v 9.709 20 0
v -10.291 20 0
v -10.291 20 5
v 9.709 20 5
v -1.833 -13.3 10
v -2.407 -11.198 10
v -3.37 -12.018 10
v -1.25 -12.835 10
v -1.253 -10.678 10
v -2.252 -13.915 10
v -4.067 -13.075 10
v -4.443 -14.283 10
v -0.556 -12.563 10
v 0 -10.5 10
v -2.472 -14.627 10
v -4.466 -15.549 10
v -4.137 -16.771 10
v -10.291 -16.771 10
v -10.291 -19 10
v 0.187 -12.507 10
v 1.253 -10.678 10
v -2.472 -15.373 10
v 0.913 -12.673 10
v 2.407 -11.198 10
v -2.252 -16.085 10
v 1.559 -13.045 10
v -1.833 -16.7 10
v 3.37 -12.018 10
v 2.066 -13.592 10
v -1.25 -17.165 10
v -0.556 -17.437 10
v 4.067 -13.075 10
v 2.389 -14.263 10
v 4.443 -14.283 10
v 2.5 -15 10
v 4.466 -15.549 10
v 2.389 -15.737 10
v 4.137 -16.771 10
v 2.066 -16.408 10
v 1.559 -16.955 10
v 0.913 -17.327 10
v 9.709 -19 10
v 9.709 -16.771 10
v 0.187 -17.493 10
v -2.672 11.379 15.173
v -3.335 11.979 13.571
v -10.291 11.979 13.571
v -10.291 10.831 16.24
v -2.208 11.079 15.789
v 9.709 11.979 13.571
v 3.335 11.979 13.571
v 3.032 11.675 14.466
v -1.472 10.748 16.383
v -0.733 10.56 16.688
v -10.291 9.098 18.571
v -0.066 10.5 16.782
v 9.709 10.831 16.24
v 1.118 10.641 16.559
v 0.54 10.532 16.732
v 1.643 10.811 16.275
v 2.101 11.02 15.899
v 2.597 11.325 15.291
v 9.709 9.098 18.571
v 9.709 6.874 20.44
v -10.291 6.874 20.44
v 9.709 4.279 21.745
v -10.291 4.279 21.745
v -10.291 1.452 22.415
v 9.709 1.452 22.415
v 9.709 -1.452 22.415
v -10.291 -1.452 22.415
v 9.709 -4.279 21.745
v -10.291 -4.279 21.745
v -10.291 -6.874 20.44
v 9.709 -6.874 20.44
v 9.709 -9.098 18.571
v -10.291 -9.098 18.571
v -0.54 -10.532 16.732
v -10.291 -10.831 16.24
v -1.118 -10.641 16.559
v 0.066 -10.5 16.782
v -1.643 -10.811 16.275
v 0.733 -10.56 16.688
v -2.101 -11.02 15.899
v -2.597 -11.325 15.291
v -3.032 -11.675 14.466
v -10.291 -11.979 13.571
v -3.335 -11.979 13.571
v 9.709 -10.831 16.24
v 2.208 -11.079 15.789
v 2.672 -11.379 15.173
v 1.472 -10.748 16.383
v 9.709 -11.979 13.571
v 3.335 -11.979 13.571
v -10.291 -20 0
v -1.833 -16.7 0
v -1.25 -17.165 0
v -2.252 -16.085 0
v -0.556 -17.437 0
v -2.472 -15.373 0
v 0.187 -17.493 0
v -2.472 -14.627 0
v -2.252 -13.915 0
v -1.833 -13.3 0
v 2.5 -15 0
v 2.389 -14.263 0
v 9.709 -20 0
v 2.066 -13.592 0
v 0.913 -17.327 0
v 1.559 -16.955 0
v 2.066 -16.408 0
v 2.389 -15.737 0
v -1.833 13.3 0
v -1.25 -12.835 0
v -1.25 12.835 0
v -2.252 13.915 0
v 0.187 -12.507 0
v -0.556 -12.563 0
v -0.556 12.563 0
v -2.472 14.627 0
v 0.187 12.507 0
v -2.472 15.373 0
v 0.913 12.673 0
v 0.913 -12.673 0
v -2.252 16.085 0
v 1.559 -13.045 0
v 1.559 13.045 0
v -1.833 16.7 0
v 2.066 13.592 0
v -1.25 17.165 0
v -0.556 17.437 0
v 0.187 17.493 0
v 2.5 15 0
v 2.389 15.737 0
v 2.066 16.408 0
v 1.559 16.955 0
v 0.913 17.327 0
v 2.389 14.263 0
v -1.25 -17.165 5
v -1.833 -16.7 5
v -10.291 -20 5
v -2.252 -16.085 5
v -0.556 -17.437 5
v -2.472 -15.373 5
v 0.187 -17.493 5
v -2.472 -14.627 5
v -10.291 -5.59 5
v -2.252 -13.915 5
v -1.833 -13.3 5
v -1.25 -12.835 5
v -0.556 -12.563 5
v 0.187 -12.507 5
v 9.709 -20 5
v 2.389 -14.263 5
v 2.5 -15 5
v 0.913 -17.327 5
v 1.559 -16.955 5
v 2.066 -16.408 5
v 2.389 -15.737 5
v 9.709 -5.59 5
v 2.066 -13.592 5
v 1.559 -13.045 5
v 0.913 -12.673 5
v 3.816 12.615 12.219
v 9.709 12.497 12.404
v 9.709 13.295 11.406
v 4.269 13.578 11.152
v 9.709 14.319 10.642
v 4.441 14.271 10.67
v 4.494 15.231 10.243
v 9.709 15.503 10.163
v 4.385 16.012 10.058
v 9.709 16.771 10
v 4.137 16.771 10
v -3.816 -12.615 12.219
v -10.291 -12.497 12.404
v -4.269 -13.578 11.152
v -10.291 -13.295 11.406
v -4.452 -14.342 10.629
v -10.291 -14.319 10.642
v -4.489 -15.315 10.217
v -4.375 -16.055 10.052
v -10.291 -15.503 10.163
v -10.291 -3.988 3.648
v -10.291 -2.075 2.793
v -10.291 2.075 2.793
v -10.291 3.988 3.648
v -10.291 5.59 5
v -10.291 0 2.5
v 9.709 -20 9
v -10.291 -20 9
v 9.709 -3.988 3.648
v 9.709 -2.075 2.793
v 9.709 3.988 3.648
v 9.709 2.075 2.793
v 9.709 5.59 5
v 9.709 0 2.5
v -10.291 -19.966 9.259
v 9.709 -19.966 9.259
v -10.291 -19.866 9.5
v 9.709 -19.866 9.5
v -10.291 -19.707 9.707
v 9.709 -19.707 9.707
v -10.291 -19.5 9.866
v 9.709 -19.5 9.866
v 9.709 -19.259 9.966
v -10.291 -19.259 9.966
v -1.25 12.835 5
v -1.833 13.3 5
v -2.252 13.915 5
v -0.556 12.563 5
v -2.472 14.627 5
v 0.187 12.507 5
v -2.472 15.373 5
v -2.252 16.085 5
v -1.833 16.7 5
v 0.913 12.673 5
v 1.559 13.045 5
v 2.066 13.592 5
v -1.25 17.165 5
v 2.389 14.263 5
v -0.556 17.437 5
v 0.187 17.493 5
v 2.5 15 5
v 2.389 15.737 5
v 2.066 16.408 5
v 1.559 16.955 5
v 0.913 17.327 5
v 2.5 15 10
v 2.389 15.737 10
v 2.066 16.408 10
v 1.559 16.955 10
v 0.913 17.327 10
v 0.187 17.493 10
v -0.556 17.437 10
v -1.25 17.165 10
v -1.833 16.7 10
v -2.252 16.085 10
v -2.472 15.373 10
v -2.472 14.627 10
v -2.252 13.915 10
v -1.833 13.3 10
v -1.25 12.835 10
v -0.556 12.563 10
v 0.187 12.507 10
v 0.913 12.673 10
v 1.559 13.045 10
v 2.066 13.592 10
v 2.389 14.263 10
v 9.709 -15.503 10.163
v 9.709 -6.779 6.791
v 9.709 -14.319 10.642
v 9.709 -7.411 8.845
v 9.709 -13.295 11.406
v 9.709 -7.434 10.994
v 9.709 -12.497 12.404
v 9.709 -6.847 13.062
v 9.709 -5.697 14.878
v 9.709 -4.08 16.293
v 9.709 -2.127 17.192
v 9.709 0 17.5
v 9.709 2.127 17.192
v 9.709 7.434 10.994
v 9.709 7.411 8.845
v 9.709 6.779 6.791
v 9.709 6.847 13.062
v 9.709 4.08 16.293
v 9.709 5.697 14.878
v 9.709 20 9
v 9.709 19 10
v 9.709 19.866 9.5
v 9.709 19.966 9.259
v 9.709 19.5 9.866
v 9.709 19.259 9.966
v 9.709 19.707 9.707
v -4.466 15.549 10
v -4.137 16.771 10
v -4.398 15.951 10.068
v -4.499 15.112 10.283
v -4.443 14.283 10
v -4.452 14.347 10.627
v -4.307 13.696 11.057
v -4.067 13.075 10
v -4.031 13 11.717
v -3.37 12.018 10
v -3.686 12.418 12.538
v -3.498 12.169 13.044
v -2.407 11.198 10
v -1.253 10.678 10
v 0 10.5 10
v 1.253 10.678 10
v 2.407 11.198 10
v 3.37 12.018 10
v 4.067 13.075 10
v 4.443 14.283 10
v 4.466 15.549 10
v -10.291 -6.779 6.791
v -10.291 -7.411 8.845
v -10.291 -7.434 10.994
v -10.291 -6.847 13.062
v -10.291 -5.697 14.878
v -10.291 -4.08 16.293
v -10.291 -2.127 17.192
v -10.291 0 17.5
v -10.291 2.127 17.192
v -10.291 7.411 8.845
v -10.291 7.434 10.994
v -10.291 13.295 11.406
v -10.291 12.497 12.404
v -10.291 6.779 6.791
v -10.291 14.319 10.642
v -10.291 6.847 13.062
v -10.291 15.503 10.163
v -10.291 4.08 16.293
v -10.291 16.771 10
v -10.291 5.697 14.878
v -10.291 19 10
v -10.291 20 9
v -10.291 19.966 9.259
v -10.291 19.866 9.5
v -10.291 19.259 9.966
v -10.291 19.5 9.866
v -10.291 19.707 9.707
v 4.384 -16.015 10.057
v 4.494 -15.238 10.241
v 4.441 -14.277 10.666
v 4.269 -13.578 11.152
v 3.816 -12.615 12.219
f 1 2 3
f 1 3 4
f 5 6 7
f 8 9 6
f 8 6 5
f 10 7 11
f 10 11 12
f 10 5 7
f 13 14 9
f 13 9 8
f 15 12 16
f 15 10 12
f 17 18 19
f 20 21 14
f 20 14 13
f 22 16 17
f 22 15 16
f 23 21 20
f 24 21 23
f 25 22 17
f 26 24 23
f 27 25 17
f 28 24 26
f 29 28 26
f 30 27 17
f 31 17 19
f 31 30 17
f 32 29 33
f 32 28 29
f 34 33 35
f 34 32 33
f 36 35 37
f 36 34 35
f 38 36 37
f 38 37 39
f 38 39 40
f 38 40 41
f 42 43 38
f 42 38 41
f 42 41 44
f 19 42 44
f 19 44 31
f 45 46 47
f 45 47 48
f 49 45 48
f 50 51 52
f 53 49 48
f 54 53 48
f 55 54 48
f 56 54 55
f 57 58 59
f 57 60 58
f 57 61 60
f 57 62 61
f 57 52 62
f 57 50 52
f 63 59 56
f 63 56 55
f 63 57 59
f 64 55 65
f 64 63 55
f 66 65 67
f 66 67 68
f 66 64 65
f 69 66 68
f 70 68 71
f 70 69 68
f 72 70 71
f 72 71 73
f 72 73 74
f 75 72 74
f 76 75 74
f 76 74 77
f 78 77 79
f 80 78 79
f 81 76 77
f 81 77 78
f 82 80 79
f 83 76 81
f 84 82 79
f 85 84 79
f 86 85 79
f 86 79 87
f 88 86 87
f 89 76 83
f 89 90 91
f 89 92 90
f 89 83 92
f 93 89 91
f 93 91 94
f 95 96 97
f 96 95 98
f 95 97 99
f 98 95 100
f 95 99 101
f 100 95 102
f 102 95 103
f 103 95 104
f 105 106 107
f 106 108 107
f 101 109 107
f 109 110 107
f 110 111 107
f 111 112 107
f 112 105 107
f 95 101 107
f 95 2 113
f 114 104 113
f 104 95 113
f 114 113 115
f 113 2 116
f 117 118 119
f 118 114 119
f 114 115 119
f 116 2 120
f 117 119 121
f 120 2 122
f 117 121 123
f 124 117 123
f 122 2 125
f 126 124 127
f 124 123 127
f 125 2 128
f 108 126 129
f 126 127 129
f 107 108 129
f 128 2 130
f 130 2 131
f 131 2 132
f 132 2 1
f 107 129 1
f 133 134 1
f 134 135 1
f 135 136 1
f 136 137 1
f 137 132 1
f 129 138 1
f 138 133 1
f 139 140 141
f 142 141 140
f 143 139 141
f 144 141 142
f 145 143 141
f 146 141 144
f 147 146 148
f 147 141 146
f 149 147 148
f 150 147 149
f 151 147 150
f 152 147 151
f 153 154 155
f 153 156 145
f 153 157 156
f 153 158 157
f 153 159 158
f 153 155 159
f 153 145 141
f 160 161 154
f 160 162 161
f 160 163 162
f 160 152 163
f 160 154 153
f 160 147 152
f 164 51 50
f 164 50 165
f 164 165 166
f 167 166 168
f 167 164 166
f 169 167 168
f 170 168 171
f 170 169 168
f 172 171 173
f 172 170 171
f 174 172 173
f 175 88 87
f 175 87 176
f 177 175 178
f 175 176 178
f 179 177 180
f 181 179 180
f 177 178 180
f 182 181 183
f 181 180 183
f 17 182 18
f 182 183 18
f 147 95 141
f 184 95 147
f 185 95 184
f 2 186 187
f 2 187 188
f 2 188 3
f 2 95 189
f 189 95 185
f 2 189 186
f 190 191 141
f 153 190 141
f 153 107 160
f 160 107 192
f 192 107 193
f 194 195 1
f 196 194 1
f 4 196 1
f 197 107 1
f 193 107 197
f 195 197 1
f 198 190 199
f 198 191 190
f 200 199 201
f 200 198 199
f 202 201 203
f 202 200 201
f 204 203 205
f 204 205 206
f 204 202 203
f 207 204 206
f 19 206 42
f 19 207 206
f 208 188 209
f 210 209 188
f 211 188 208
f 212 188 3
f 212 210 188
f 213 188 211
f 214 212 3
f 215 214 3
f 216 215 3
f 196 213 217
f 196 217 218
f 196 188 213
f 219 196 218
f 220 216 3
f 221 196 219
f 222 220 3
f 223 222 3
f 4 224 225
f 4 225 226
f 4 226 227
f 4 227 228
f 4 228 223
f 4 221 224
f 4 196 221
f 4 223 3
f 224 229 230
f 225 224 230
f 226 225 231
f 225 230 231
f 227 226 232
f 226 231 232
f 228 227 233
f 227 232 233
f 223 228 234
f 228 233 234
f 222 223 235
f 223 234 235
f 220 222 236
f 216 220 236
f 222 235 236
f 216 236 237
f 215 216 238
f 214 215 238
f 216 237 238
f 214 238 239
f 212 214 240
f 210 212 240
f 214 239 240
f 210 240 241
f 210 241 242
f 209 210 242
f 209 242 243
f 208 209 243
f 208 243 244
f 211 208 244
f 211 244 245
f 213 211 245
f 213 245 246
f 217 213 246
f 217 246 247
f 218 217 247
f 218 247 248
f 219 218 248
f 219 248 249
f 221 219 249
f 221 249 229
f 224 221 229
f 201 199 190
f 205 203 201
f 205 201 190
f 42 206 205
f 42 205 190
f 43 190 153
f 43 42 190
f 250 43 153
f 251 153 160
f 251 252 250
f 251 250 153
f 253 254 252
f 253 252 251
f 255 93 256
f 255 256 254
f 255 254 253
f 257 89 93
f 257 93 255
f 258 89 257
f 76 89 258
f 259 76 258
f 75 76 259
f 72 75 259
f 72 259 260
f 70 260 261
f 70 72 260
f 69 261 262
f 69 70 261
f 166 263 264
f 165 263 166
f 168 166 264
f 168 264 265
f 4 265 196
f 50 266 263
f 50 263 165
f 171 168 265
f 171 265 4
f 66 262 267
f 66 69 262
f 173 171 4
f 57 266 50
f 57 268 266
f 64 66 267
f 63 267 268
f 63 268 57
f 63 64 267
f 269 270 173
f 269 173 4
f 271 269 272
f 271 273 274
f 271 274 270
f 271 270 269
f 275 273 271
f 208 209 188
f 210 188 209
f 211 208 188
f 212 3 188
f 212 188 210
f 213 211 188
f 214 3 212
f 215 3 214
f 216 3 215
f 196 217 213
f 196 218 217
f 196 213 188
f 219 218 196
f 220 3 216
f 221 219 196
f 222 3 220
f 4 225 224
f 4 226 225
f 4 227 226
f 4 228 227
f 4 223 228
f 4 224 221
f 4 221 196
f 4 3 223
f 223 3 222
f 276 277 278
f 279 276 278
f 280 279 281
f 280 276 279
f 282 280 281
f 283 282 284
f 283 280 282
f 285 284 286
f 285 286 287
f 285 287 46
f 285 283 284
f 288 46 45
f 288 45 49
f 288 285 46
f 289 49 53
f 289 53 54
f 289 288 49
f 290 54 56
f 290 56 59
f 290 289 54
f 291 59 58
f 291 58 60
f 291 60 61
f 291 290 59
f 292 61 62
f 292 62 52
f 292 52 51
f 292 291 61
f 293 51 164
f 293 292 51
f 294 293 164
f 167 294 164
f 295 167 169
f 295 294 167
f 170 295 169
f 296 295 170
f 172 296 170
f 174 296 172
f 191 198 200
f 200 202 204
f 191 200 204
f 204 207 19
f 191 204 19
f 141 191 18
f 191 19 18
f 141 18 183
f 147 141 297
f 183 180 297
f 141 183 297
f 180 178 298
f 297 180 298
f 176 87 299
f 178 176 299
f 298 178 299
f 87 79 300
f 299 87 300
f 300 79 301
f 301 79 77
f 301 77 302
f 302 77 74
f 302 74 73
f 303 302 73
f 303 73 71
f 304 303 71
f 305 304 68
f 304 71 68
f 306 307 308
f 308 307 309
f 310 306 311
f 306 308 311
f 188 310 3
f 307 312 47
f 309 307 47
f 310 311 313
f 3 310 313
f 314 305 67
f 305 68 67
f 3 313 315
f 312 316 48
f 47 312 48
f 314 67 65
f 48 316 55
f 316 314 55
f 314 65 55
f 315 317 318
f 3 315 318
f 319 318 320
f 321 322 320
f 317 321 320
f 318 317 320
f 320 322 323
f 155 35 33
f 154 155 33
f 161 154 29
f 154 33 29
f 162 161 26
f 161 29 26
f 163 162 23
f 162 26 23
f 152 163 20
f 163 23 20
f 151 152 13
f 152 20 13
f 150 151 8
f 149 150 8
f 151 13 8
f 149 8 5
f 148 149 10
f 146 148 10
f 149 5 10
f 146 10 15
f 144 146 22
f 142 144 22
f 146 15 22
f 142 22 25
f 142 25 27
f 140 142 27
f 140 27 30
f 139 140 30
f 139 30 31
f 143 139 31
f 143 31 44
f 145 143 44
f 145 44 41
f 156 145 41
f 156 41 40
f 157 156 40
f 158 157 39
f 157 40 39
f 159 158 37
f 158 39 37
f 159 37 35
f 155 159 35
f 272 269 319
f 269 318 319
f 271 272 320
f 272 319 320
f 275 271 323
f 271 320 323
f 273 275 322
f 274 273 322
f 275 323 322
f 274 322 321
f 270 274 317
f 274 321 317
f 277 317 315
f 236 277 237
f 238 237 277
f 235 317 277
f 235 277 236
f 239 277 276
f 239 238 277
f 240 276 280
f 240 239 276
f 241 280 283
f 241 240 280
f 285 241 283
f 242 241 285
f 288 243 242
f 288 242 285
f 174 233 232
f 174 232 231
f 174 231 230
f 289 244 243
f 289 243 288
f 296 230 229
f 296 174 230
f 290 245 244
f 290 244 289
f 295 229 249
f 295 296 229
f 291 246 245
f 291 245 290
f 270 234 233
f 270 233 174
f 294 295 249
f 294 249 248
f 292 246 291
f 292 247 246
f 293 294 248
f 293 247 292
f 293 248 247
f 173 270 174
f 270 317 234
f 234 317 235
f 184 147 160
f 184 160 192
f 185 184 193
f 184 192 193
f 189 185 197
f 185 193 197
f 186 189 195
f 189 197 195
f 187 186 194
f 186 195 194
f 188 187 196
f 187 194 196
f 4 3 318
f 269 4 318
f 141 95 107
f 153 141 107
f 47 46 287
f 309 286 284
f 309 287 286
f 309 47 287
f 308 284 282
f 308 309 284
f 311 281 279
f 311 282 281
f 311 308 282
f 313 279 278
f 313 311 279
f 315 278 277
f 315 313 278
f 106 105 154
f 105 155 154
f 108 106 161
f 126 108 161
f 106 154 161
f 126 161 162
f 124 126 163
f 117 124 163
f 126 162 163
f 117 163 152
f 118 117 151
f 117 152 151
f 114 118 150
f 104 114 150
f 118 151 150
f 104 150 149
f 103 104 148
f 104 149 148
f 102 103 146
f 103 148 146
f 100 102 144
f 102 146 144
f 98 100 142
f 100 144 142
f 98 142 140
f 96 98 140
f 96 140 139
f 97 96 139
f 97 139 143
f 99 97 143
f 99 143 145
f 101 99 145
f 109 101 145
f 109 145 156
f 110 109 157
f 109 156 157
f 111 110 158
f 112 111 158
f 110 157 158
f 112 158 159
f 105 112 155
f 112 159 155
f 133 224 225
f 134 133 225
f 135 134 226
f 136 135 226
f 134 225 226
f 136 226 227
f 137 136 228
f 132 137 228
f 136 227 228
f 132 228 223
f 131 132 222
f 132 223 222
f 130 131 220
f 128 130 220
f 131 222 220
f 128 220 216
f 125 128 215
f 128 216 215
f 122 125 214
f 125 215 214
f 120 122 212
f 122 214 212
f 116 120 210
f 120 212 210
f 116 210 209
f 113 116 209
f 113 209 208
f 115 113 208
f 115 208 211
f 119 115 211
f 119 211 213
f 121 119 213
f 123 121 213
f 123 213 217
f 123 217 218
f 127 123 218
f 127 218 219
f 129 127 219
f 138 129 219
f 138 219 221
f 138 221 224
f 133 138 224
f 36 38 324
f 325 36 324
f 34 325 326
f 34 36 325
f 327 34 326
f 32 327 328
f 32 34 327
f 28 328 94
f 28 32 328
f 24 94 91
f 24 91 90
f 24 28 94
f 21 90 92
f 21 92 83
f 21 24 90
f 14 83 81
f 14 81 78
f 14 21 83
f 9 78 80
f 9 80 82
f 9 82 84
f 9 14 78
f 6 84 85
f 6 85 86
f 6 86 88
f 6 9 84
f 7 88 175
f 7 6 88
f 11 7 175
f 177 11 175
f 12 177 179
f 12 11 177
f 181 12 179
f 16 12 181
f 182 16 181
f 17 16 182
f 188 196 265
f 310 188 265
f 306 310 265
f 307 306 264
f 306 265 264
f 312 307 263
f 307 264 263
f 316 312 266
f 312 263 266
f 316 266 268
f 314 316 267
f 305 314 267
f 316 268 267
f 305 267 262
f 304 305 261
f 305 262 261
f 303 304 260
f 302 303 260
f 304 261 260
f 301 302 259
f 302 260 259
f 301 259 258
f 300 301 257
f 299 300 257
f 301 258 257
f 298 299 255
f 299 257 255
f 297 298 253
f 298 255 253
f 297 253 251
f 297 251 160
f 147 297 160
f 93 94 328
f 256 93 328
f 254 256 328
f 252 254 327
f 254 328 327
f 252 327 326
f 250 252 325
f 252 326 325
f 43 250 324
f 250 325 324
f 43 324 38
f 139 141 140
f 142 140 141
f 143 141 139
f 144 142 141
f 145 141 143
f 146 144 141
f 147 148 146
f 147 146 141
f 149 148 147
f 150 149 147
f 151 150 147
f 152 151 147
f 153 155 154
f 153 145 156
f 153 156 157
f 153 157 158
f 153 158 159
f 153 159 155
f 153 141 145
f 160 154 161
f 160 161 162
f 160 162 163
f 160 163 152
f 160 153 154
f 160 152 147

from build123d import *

# Parameters (mm, degrees)
F0_W      = 20
F0_H      = 40
F1_DEPTH  = 5
F3_DEPTH  = 20
F4_R      = 7.5
F5_DEPTH  = 20
F6_R      = 5
F7_R      = 2.5
F8_DEPTH  = 12.5
F9_R      = 4.5
F10_DEPTH = 8
F11_R     = 1


with BuildPart() as f1:
    # F0 (on Top) → F1 (new body)
    with BuildSketch(Plane.XY):
        with Locations((-0.29059, 0)):
            Rectangle(F0_W, F0_H)
    extrude(amount=F1_DEPTH)


with BuildPart() as f3:
    # F2 (on face) → F3 (new body, through all)
    with BuildSketch(Plane.YZ.offset(9.70941)):
        with BuildLine():
            Line((-20, 10), (-20, 5))
            Line((-20, 5), (20, 5))
            Line((20, 5), (20, 10))
            Line((20, 10), (12.5, 10))
            ThreePointArc((12.5, 10), (0, 22.5), (-12.5, 10))
            Line((-12.5, 10), (-20, 10))
        make_face()
    extrude(amount=-F3_DEPTH)


with BuildPart() as f5_tool:
    # F4 (on face) → F5 (new body, through all)
    with BuildSketch(Plane.YZ.offset(9.70941)):
        with Locations((0, 10)):
            Circle(F4_R)
    extrude(amount=-F5_DEPTH)


with BuildPart() as f1_1:
    add(f1.part)

    # F5: cut by f5_tool
    add(f5_tool.part, mode=Mode.SUBTRACT)


with BuildPart() as f3_1:
    add(f3.part)

    # F5: cut by f5_tool
    add(f5_tool.part, mode=Mode.SUBTRACT)

    # F6
    f6_edges = [f3_1.edges().sort_by_distance(p)[0] for p in [
        (-0.29059, 12.5, 10),
        (-0.29059, -12.5, 10),
    ]]
    fillet(f6_edges, radius=F6_R)


with BuildPart() as f8_tool:
    # F7 (on face) → F8 (new body, symmetric)
    with BuildSketch(Plane.XY.offset(10)):
        with Locations((0, 15)):
            Circle(F7_R)
        with Locations((0, -15)):
            Circle(F7_R)
    extrude(amount=F8_DEPTH, both=True)


with BuildPart() as f1_2:
    add(f1_1.part)

    # F8: cut by f8_tool
    add(f8_tool.part, mode=Mode.SUBTRACT)


with BuildPart() as f3_2:
    add(f3_1.part)

    # F8: cut by f8_tool
    add(f8_tool.part, mode=Mode.SUBTRACT)

    # F9 (on face) → F10 (cut)
    with BuildSketch(Plane.XY.offset(10)):
        with Locations((0, -15)):
            Circle(F9_R)
        with Locations((0, 15)):
            Circle(F9_R)
    extrude(amount=F10_DEPTH, mode=Mode.SUBTRACT)

    # F11
    f11_edges = [f3_2.edges().sort_by_distance(p)[0] for p in [
        (-0.29059, 20, 10),
        (-0.29059, -20, 10),
    ]]
    fillet(f11_edges, radius=F11_R)


solid = Compound([f1_2.part, f3_2.part])
